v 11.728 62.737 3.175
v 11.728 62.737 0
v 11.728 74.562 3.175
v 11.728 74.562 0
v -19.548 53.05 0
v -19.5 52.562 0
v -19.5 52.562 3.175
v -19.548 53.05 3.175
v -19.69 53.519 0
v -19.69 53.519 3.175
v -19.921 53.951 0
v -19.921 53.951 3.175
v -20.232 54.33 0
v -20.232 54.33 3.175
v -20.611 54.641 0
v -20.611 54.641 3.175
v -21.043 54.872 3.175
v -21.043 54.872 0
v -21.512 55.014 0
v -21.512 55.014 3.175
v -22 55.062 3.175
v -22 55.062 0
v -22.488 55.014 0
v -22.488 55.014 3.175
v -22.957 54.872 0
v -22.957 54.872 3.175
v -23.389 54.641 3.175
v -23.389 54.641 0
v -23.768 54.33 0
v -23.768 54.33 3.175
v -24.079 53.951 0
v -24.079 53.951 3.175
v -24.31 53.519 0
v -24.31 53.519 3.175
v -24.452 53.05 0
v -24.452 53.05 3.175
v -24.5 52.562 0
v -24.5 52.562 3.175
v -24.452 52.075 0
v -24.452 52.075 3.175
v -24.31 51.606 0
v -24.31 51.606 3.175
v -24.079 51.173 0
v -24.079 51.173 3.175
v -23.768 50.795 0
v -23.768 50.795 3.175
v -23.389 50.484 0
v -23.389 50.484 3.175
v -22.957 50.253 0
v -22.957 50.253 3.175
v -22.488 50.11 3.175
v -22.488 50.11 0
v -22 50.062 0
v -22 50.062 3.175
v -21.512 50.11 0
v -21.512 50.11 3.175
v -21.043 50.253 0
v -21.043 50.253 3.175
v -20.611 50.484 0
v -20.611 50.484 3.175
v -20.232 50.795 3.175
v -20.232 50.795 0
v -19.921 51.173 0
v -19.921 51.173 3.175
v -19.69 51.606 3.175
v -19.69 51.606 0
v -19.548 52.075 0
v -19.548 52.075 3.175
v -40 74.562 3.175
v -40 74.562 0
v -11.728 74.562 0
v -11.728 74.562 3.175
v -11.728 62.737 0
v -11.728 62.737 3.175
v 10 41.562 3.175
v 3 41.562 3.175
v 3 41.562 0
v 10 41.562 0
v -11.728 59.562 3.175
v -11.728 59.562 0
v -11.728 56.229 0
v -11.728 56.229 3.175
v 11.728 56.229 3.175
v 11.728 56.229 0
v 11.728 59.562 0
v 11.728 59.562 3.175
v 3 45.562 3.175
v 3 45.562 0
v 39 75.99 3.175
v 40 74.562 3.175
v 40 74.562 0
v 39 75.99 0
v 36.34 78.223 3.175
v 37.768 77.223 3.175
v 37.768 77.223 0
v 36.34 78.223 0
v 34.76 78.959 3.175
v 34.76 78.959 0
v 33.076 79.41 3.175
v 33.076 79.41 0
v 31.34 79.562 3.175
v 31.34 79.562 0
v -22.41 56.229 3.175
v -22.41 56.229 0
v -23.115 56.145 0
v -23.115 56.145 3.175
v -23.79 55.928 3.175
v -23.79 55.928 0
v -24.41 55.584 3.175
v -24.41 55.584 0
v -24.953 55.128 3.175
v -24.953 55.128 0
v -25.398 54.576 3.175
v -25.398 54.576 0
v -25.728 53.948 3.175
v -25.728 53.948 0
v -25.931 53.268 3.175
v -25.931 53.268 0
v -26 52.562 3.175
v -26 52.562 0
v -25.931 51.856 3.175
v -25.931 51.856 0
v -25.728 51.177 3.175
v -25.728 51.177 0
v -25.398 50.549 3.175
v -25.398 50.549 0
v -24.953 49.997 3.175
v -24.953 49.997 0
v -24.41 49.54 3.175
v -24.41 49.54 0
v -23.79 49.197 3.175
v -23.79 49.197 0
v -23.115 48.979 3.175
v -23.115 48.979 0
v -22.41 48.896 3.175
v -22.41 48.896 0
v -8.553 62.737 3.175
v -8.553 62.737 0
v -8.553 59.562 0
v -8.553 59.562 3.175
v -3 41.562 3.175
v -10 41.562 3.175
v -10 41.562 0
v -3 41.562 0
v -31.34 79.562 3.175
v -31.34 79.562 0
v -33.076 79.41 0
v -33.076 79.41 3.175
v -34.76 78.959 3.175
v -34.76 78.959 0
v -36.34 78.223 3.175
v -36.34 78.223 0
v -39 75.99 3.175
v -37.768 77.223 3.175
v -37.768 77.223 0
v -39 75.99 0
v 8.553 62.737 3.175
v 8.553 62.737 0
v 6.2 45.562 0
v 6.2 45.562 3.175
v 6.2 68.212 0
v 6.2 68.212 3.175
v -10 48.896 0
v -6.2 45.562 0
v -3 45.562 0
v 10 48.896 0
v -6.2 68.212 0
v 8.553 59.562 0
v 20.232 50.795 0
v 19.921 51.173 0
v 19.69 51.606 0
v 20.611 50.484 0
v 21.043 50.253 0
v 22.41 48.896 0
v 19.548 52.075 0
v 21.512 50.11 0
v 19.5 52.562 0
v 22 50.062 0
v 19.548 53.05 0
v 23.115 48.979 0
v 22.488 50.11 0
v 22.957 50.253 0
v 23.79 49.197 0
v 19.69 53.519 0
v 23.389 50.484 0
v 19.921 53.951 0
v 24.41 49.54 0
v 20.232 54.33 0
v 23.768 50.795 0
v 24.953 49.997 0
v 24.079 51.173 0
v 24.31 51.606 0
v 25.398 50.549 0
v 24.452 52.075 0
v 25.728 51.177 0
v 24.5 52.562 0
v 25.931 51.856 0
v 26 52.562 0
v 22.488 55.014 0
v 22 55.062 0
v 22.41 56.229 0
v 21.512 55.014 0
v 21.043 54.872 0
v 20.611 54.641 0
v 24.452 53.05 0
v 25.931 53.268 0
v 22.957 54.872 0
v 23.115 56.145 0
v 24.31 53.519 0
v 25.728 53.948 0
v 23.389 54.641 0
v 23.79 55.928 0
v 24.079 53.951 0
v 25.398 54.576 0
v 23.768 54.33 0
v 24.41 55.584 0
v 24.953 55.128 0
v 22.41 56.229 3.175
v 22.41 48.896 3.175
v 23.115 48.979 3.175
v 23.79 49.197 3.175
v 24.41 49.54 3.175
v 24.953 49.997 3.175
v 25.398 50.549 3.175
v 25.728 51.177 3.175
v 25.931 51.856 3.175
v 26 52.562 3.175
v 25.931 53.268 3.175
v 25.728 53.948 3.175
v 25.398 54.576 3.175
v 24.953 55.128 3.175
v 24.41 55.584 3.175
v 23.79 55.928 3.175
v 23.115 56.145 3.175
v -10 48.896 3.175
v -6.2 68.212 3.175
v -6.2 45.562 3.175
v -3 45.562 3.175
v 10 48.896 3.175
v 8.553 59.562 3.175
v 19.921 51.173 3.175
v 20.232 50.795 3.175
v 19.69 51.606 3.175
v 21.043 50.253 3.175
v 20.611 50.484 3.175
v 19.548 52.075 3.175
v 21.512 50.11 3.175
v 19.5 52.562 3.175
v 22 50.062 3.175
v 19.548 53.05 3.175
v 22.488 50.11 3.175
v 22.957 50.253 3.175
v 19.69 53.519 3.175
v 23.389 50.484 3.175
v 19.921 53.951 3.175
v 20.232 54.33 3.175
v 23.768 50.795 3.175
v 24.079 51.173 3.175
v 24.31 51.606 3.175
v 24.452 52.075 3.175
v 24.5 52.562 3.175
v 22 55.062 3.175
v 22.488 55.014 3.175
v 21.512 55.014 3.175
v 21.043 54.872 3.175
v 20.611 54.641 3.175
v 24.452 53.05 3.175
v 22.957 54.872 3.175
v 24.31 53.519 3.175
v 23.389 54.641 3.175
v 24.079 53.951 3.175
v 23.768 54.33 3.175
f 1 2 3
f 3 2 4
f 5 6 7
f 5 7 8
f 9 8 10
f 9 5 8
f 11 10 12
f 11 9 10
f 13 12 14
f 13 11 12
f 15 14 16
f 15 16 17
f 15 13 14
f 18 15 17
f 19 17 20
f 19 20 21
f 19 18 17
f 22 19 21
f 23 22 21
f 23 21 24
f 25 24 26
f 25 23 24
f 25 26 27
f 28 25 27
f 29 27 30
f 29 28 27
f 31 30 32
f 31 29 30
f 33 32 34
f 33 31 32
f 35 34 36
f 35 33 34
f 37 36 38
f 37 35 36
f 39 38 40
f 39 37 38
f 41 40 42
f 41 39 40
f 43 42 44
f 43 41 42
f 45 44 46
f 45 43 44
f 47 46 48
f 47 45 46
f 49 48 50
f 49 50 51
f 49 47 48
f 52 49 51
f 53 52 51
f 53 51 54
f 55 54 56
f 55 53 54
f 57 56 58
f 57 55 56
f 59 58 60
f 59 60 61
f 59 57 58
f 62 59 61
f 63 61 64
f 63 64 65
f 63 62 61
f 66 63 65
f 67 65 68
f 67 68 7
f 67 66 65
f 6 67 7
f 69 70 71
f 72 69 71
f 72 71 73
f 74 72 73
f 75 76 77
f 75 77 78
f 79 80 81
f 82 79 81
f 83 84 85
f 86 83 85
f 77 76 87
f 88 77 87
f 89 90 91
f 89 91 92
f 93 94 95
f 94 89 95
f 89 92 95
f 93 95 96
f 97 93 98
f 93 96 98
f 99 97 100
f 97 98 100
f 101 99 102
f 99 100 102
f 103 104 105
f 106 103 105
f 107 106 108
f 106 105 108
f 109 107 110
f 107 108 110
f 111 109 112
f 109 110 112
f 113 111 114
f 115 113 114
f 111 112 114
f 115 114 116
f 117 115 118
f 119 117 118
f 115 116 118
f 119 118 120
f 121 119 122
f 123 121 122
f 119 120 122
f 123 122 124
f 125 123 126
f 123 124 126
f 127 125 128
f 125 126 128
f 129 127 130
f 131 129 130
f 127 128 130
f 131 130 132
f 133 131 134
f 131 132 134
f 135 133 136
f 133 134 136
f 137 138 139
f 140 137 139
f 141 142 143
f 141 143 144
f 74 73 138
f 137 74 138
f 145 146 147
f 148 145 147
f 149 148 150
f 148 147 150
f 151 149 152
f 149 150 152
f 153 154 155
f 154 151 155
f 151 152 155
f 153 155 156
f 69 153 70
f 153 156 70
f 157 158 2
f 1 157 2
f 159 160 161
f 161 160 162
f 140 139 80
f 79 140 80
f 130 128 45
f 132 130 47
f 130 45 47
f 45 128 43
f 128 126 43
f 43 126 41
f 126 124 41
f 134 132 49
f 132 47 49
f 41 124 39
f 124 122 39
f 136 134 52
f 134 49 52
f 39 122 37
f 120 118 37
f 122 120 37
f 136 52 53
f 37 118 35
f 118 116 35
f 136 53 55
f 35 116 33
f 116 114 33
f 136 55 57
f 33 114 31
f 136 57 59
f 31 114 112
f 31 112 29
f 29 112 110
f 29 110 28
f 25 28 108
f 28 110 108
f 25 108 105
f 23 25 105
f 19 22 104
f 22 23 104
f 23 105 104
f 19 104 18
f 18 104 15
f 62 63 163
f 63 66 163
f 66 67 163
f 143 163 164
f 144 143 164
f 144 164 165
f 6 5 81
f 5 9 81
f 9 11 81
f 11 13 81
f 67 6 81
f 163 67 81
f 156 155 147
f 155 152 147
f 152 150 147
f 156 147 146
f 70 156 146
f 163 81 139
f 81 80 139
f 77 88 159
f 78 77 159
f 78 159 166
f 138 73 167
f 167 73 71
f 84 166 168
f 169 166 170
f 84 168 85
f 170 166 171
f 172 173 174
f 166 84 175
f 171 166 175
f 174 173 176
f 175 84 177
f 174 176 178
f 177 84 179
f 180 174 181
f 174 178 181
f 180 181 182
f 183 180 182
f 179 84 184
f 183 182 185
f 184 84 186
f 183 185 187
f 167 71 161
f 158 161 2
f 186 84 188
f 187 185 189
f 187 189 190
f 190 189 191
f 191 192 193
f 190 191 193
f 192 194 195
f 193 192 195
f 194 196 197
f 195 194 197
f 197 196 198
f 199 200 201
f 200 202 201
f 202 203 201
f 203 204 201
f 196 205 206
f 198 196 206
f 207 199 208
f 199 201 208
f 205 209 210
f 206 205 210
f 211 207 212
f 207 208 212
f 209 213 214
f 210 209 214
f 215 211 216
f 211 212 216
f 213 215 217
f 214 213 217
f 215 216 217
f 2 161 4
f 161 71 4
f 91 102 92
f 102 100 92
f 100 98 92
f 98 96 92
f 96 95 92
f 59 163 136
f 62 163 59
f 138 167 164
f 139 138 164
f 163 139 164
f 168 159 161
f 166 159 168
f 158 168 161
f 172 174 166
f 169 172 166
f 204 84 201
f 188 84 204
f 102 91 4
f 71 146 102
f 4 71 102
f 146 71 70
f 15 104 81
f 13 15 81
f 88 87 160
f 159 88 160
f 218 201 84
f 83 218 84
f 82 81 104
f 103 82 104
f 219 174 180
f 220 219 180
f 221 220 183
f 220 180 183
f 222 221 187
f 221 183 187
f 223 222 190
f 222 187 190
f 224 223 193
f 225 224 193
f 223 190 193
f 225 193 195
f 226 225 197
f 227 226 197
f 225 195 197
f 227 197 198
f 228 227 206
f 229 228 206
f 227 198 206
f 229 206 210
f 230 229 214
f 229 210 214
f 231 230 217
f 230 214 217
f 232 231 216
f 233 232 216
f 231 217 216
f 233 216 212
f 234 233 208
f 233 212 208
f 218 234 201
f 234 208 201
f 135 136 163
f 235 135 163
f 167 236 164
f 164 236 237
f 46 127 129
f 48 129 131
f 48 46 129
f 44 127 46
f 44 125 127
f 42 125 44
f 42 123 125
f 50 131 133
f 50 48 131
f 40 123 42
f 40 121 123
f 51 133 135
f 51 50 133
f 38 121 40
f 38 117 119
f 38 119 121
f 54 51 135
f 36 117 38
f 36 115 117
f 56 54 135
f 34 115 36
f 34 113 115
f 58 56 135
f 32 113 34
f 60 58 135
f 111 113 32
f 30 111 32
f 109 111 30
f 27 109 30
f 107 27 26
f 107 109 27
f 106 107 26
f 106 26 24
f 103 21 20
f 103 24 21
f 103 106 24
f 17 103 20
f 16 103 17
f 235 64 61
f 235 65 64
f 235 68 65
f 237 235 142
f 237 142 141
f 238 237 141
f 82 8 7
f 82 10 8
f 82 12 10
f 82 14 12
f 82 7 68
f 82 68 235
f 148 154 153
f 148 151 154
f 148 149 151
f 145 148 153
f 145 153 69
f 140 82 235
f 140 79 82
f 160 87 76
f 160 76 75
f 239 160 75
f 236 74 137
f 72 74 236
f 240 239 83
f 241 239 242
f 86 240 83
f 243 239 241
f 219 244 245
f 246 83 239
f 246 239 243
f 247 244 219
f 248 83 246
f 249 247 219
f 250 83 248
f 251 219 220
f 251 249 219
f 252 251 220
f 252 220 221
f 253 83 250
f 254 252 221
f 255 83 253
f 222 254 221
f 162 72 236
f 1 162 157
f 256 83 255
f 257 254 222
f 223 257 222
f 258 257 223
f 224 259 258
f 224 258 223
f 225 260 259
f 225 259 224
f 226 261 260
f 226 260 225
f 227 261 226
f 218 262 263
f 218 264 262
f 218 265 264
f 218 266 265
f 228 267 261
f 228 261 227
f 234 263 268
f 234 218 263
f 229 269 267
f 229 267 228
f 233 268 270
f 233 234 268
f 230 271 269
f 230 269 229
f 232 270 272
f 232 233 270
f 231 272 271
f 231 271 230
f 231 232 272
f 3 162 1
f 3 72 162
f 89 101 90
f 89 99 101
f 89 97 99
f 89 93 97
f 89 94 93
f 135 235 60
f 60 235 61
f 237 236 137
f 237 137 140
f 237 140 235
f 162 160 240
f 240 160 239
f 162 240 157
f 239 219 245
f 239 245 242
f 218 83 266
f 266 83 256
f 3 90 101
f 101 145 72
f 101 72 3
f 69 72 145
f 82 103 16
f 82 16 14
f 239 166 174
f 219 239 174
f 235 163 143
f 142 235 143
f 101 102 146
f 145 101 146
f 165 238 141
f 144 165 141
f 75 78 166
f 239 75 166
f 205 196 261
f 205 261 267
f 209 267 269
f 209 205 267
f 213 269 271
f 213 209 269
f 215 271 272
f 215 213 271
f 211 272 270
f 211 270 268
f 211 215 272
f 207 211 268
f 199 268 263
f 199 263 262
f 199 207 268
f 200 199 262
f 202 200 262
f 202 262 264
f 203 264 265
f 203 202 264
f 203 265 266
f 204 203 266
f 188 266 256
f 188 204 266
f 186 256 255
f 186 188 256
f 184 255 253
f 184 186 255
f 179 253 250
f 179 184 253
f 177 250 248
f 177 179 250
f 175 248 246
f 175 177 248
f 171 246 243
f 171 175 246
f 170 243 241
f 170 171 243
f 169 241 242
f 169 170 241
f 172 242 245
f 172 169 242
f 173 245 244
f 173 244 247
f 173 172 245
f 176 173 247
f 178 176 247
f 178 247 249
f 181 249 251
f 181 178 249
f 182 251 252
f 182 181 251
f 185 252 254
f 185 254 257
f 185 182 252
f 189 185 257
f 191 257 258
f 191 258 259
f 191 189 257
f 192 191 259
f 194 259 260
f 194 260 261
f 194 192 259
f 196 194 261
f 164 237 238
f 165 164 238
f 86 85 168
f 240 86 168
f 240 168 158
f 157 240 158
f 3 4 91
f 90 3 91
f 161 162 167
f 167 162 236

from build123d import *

# Parameters (mm, degrees)
SKETCH1_R           = 2.5
BOSS_EXTRUDE1_DEPTH = 3.175
FILLET1_R           = 10
SKETCH2_W           = 9
SKETCH2_H           = 21
CUT_EXTRUDE1_DEPTH  = 90.108082017
FILLET2_R           = 10
SKETCH4_W           = 90.343709808
SKETCH4_H           = 29.159436912
CUT_EXTRUDE3_DEPTH  = 83
CUT_EXTRUDE4_DEPTH  = 90.108082017


with BuildPart() as part:
    # Sketch1 → Boss-Extrude1 (new body)
    with BuildSketch(Plane.XY):
        with BuildLine():
            Line((-9.56, -38.262636689), (-9.56, -41.437636689))
            Line((-9.56, -41.437636689), (9.56, -41.437636689))
            Line((9.56, -41.437636689), (9.56, -38.262636689))
            Line((9.56, -38.262636689), (12.735, -38.262636689))
            Line((12.735, -38.262636689), (12.735, -41.437636689))
            Line((12.735, -41.437636689), (15.91, -41.437636689))
            Line((15.91, -41.437636689), (21.91, -41.437636689))
            Line((21.91, -41.437636689), (21.91, -32.437636689))
            Line((21.91, -32.437636689), (18.735, -32.437636689))
            Line((18.735, -32.437636689), (18.735, -20.437636689))
            Line((18.735, -20.437636689), (21.91, -20.437636689))
            Line((21.91, -20.437636689), (21.91, -9.437636689))
            Line((21.91, -9.437636689), (40, -9.437636689))
            Line((40, -9.437636689), (40, 30.562363311))
            Line((40, 30.562363311), (10, 30.562363311))
            Line((10, 30.562363311), (10, 45.562363311))
            Line((10, 45.562363311), (10, 48.89577614))
            Line((10, 48.89577614), (22.410269523, 48.89577614))
            ThreePointArc((22.410269523, 48.89577614), (26.000000001, 52.562363311), (22.410269523, 56.228950483))
            Line((22.410269523, 56.228950483), (11.727794547, 56.228950483))
            Line((11.727794547, 56.228950483), (11.727794547, 59.562363311))
            Line((11.727794547, 59.562363311), (10, 59.562363311))
            Line((10, 59.562363311), (8.552794547, 59.562363311))
            Line((8.552794547, 59.562363311), (8.552794547, 62.737363311))
            Line((8.552794547, 62.737363311), (11.727794547, 62.737363311))
            Line((11.727794547, 62.737363311), (11.727794547, 74.562363311))
            Line((11.727794547, 74.562363311), (40, 74.562363311))
            Line((40, 74.562363311), (40, 79.562363311))
            Line((40, 79.562363311), (0, 79.562363311))
            Line((0, 79.562363311), (-40, 79.562363311))
            Line((-40, 79.562363311), (-40, 74.562363311))
            Line((-40, 74.562363311), (-11.727794547, 74.562363311))
            Line((-11.727794547, 74.562363311), (-11.727794547, 62.737363311))
            Line((-11.727794547, 62.737363311), (-8.552794547, 62.737363311))
            Line((-8.552794547, 62.737363311), (-8.552794547, 59.562363311))
            Line((-8.552794547, 59.562363311), (-10, 59.562363311))
            Line((-10, 59.562363311), (-11.727794547, 59.562363311))
            Line((-11.727794547, 59.562363311), (-11.727794547, 56.228950483))
            Line((-11.727794547, 56.228950483), (-22.410269523, 56.228950483))
            ThreePointArc((-22.410269523, 56.228950483), (-26.000000001, 52.562363311), (-22.410269523, 48.89577614))
            Line((-22.410269523, 48.89577614), (-10, 48.89577614))
            Line((-10, 48.89577614), (-10, 45.562363311))
            Line((-10, 45.562363311), (-10, 30.562363311))
            Line((-10, 30.562363311), (-40, 30.562363311))
            Line((-40, 30.562363311), (-40, -9.437636689))
            Line((-40, -9.437636689), (-21.91, -9.437636689))
            Line((-21.91, -9.437636689), (-21.91, -20.437636689))
            Line((-21.91, -20.437636689), (-18.735, -20.437636689))
            Line((-18.735, -20.437636689), (-18.735, -32.437636689))
            Line((-18.735, -32.437636689), (-21.91, -32.437636689))
            Line((-21.91, -32.437636689), (-21.91, -41.437636689))
            Line((-21.91, -41.437636689), (-15.91, -41.437636689))
            Line((-15.91, -41.437636689), (-12.735, -41.437636689))
            Line((-12.735, -41.437636689), (-12.735, -38.262636689))
            Line((-12.735, -38.262636689), (-9.56, -38.262636689))
        make_face()
        with BuildLine():
            Line((4, 1.562363311), (-4, 1.562363311))
            ThreePointArc((-4, 1.562363311), (-4.707106781, 1.85525653), (-5, 2.562363311))
            Line((-5, 2.562363311), (-5, 3.562363311))
            ThreePointArc((-5, 3.562363311), (-4.707106781, 4.269470092), (-4, 4.562363311))
            Line((-4, 4.562363311), (4, 4.562363311))
            ThreePointArc((4, 4.562363311), (4.707106781, 4.269470092), (5, 3.562363311))
            Line((5, 3.562363311), (5, 2.562363311))
            ThreePointArc((5, 2.562363311), (4.707106781, 1.85525653), (4, 1.562363311))
        make_face(mode=Mode.SUBTRACT)
        with Locations((-22, 52.562363311)):
            Circle(SKETCH1_R, mode=Mode.SUBTRACT)
        with Locations((22, 52.562363311)):
            Circle(SKETCH1_R, mode=Mode.SUBTRACT)
    extrude(amount=BOSS_EXTRUDE1_DEPTH)

    # Fillet1
    # the kernel refuses this fillet: 10 mm, written as the material it takes off along each edge
    with BuildSketch(Plane(origin=(-40, 79.562363311, -21.650635095), x_dir=(0, -1, 0), z_dir=(0, 0, 1))) as fillet1_piece_1:
        with BuildLine():
            CenterArc((10, 8.660254038), FILLET1_R, 180, 60)
            Line((0, 8.660254038), (-0.2, 8.660254038))
            Line((-0.2, 8.660254038), (-0.2, 0))
            Line((-0.2, 0), (0, -0.2))
            ThreePointArc((0, -0.2), (2.5, -0.2), (4.9, -0.173205081))
            Line((4.9, -0.173205081), (5, 0))
        make_face()
    extrude(amount=46.476270189, mode=Mode.SUBTRACT)
    with BuildSketch(Plane(origin=(40, 79.562363311, -21.650635095), x_dir=(-1, 0, 0), z_dir=(0, 0, 1))) as fillet1_piece_2:
        with BuildLine():
            CenterArc((8.660254038, 10), FILLET1_R, 210, 60)
            Line((0, 5), (-0.173205081, 4.9))
            ThreePointArc((-0.173205081, 4.9), (-0.2, 2.5), (-0.2, 0))
            Line((-0.2, 0), (0, -0.2))
            Line((0, -0.2), (8.660254038, -0.2))
            Line((8.660254038, -0.2), (8.660254038, 0))
        make_face()
    extrude(amount=46.476270189, mode=Mode.SUBTRACT)

    # Sketch2 → Cut-Extrude1 (cut, through all)
    with BuildSketch(Plane.XY.offset(3.175)):
        with Locations((-12.61, -26.137636689)):
            Rectangle(SKETCH2_W, SKETCH2_H)
    extrude(amount=-CUT_EXTRUDE1_DEPTH, mode=Mode.SUBTRACT)

    # Fillet2
    fillet2_edges = [part.edges().sort_by_distance(p)[0] for p in [
        (40, 30.562363311, 1.5875),
        (40, -9.437636689, 1.5875),
        (-40, -9.437636689, 1.5875),
        (-40, 30.562363311, 1.5875),
    ]]
    fillet(fillet2_edges, radius=FILLET2_R)

    # Sketch4 → Cut-Extrude3 (cut)
    with BuildSketch(Plane.XZ.offset(41.437636689)):
        Rectangle(SKETCH4_W, SKETCH4_H)
    extrude(amount=-CUT_EXTRUDE3_DEPTH, mode=Mode.SUBTRACT)

    # Sketch5 → Cut-Extrude4 (cut, through all)
    with BuildSketch(Plane.XY.offset(3.175)):
        Polygon((6.2, 68.212363311), (-6.2, 68.212363311), (-6.2, 45.562363311), (-3, 45.562363311), (-3, 40.562363311), (-0.113822398, 40.562363311), (0.113822398, 40.562363311), (3, 40.562363311), (3, 45.562363311), (6.2, 45.562363311), align=None)
    extrude(amount=-CUT_EXTRUDE4_DEPTH, mode=Mode.SUBTRACT)


solid = part.part
